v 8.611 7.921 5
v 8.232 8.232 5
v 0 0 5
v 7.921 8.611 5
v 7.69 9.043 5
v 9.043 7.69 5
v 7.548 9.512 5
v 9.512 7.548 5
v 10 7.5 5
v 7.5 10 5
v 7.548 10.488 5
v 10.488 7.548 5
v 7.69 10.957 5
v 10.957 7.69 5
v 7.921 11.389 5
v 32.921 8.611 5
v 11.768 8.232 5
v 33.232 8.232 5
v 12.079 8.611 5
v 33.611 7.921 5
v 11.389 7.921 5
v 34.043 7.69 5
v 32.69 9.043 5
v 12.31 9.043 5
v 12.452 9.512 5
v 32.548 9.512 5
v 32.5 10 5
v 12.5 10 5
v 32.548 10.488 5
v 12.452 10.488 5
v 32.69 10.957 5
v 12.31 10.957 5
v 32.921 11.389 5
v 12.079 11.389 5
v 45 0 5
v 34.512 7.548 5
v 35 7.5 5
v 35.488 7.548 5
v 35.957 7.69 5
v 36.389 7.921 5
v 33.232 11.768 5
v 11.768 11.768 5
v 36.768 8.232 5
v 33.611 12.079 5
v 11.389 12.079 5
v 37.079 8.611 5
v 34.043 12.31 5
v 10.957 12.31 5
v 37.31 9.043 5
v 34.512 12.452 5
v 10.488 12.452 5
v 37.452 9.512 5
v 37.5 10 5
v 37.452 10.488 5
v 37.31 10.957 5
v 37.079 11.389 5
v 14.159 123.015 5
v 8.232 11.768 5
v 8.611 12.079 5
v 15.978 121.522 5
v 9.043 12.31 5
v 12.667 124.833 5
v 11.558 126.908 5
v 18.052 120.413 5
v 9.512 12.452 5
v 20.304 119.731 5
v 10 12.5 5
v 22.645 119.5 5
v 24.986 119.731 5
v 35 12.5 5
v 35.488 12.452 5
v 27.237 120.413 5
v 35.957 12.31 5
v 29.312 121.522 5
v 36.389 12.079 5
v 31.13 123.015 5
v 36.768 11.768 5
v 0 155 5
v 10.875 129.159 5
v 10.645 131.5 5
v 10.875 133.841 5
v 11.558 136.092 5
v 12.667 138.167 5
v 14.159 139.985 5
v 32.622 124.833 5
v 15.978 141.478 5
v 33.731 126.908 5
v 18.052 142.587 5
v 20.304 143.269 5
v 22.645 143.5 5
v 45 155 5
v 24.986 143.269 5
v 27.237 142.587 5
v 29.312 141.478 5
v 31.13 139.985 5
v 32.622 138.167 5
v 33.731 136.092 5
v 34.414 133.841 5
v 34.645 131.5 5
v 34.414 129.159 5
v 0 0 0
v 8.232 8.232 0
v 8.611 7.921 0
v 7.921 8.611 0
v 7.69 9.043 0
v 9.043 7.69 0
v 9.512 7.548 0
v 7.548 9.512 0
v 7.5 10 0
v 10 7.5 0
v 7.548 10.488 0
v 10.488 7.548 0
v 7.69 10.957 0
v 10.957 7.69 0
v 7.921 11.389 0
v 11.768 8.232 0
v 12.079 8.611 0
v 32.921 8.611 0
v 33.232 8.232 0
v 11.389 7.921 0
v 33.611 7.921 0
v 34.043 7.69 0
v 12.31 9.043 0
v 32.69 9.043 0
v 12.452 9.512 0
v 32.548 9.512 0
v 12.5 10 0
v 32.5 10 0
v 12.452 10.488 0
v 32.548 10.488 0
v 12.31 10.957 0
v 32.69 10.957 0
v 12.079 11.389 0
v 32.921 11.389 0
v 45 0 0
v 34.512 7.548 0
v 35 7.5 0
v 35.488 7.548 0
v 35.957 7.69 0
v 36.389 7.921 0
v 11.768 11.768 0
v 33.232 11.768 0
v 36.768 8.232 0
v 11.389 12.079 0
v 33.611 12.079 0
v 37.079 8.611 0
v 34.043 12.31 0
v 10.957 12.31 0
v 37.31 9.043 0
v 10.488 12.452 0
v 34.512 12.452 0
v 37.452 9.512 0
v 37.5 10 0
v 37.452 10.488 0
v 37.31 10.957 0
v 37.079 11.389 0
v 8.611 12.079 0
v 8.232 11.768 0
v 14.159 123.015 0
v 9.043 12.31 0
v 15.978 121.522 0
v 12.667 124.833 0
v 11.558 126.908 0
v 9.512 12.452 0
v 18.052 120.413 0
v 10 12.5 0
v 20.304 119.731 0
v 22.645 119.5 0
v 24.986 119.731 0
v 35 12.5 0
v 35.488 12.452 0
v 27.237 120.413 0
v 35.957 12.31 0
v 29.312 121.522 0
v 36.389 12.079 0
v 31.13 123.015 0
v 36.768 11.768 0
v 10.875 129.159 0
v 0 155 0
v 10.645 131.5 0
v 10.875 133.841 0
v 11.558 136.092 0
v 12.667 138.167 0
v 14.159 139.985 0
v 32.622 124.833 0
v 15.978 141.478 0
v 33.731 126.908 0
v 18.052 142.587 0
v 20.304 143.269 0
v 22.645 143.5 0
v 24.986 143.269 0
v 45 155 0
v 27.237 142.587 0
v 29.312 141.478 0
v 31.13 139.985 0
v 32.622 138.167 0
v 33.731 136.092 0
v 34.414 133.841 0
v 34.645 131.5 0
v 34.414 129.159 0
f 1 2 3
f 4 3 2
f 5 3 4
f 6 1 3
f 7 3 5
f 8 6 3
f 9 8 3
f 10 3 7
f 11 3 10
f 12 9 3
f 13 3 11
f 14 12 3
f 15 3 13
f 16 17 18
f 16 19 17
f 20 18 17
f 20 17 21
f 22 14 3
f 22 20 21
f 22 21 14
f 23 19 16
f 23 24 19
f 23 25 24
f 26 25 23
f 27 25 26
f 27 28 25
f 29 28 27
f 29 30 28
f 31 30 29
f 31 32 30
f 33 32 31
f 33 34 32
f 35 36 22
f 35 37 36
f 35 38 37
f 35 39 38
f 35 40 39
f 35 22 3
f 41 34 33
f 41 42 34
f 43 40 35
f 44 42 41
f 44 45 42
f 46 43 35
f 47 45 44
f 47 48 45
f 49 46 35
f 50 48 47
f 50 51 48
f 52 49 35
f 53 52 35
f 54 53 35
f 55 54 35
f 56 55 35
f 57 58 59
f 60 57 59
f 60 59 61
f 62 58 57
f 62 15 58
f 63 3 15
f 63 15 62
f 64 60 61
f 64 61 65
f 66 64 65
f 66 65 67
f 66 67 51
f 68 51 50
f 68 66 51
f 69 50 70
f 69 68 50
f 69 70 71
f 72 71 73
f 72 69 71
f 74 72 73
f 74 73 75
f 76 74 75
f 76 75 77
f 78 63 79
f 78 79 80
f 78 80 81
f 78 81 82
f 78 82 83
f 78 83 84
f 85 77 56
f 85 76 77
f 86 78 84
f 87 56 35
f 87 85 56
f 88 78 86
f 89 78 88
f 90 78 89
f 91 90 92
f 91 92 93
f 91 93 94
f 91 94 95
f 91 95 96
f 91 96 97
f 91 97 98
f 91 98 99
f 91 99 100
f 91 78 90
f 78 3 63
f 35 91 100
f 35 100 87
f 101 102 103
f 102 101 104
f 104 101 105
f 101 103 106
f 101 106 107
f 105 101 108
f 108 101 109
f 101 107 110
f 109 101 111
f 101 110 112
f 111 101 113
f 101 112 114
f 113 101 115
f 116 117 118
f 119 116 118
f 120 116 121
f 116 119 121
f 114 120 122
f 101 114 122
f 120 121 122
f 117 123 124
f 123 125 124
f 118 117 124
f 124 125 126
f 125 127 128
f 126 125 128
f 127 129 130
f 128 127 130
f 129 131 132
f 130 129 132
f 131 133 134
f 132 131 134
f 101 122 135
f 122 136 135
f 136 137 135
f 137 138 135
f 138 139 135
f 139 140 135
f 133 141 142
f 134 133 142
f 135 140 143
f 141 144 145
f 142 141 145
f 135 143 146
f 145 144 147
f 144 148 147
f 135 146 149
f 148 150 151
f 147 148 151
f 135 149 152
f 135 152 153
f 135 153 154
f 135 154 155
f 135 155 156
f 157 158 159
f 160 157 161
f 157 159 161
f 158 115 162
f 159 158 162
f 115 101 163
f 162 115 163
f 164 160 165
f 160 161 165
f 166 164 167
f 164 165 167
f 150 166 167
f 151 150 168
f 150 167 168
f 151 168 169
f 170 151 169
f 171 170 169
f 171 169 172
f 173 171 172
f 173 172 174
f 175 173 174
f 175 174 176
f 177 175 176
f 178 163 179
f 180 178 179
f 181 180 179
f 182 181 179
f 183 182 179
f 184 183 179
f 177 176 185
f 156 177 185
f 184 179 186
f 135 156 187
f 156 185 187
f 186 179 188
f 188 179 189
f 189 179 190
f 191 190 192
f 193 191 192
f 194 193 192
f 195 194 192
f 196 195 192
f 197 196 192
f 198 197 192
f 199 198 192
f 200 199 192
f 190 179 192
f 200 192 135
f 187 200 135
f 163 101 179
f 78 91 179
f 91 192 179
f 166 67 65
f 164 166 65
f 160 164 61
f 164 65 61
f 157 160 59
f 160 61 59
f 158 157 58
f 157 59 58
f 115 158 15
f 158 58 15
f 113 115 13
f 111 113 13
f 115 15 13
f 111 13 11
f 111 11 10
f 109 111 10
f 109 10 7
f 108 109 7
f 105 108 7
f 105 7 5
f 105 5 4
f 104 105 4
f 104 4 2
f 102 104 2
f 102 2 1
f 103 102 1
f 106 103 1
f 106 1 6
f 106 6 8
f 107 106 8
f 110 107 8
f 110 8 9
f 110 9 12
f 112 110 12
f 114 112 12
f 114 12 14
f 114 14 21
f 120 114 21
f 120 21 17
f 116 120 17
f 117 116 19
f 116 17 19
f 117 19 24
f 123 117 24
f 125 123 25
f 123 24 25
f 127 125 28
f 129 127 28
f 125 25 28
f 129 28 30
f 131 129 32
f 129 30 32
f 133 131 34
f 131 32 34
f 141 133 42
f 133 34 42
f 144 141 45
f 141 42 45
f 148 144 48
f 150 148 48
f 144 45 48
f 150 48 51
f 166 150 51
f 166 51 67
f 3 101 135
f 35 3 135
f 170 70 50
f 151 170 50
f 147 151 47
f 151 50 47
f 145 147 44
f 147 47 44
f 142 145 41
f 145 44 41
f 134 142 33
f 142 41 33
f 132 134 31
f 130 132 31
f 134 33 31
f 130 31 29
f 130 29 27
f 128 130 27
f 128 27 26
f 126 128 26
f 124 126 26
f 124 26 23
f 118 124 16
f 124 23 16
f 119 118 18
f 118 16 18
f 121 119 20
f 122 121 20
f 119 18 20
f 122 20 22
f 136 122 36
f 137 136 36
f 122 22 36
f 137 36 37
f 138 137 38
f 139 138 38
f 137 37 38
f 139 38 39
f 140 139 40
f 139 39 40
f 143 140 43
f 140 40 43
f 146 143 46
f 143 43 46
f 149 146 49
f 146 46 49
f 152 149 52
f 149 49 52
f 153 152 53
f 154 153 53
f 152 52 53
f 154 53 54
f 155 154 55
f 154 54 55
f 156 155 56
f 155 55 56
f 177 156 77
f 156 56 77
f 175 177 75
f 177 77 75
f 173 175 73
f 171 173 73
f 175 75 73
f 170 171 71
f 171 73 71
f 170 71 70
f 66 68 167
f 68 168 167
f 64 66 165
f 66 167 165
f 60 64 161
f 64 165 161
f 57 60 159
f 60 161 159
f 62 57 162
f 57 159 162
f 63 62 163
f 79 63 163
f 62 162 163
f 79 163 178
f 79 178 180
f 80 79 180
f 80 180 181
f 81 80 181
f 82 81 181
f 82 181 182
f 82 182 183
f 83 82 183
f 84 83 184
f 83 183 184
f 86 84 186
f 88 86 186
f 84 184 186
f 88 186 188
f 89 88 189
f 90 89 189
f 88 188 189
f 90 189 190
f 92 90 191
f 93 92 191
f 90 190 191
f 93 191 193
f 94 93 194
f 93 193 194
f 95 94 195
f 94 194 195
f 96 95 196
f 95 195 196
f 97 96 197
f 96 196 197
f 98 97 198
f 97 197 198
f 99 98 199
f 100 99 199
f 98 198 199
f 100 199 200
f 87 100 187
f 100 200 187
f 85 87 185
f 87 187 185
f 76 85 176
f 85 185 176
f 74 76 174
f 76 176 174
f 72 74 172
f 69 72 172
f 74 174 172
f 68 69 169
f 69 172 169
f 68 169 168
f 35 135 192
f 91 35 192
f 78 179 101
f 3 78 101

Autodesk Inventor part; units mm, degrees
ref_plane "YZ Plane" through (0, 0, 0) normal (1, 0, 0) x (0, 1, 0)
ref_plane "XZ Plane" through (0, 0, 0) normal (0, 1, 0) x (-1, 0, 0)
ref_plane "XY Plane" through (0, 0, 0) normal (0, 0, 1) x (1, 0, 0)
sketch "スケッチ1" plane through (0, 0, 0) normal (0, 0, 1) x (1, 0, 0)
  line L0 (0, 0) -> (45, 0)
  line L1 (45, 0) -> (45, 155)
  line L2 (45, 155) -> (0, 155)
  line L3 (0, 155) -> (0, 0)
  dimension "d0" = 155
  dimension "d1" = 45
extrude "押し出し1" add sketch "スケッチ1" along normal blind 5
sketch "スケッチ2" plane through (0, 0, 5) normal (0, 0, 1) x (1, 0, 0)
  line L0 (0, 0) -> (45, 0) projected
  point P0 (22.6447, 131.5)
  dimension "d4" = 131.5
hole "穴1" at (22.6447, 131.5, 5) direction (0, 0, -1) diameter 24 end through all
sketch "スケッチ3" plane through (0, 0, 0) normal (0, 0, -1) x (-1, 0, 0)
  line L0 (0, 0) -> (-45, 0) projected
  line L1 (-45, 0) -> (-45, 155) projected
  line L2 (0, 155) -> (0, 0) projected
  point P0 (-10, 10)
  point P1 (-35, 10)
  dimension "d12" = 10
  dimension "d13" = 10
  dimension "d14" = 10
  dimension "d15" = 10
hole "穴2" at (10, 10, 0) at (35, 10, 0) direction (0, 0, 1) diameter 5 end through all
properties part number "回転軸取り付け板"
